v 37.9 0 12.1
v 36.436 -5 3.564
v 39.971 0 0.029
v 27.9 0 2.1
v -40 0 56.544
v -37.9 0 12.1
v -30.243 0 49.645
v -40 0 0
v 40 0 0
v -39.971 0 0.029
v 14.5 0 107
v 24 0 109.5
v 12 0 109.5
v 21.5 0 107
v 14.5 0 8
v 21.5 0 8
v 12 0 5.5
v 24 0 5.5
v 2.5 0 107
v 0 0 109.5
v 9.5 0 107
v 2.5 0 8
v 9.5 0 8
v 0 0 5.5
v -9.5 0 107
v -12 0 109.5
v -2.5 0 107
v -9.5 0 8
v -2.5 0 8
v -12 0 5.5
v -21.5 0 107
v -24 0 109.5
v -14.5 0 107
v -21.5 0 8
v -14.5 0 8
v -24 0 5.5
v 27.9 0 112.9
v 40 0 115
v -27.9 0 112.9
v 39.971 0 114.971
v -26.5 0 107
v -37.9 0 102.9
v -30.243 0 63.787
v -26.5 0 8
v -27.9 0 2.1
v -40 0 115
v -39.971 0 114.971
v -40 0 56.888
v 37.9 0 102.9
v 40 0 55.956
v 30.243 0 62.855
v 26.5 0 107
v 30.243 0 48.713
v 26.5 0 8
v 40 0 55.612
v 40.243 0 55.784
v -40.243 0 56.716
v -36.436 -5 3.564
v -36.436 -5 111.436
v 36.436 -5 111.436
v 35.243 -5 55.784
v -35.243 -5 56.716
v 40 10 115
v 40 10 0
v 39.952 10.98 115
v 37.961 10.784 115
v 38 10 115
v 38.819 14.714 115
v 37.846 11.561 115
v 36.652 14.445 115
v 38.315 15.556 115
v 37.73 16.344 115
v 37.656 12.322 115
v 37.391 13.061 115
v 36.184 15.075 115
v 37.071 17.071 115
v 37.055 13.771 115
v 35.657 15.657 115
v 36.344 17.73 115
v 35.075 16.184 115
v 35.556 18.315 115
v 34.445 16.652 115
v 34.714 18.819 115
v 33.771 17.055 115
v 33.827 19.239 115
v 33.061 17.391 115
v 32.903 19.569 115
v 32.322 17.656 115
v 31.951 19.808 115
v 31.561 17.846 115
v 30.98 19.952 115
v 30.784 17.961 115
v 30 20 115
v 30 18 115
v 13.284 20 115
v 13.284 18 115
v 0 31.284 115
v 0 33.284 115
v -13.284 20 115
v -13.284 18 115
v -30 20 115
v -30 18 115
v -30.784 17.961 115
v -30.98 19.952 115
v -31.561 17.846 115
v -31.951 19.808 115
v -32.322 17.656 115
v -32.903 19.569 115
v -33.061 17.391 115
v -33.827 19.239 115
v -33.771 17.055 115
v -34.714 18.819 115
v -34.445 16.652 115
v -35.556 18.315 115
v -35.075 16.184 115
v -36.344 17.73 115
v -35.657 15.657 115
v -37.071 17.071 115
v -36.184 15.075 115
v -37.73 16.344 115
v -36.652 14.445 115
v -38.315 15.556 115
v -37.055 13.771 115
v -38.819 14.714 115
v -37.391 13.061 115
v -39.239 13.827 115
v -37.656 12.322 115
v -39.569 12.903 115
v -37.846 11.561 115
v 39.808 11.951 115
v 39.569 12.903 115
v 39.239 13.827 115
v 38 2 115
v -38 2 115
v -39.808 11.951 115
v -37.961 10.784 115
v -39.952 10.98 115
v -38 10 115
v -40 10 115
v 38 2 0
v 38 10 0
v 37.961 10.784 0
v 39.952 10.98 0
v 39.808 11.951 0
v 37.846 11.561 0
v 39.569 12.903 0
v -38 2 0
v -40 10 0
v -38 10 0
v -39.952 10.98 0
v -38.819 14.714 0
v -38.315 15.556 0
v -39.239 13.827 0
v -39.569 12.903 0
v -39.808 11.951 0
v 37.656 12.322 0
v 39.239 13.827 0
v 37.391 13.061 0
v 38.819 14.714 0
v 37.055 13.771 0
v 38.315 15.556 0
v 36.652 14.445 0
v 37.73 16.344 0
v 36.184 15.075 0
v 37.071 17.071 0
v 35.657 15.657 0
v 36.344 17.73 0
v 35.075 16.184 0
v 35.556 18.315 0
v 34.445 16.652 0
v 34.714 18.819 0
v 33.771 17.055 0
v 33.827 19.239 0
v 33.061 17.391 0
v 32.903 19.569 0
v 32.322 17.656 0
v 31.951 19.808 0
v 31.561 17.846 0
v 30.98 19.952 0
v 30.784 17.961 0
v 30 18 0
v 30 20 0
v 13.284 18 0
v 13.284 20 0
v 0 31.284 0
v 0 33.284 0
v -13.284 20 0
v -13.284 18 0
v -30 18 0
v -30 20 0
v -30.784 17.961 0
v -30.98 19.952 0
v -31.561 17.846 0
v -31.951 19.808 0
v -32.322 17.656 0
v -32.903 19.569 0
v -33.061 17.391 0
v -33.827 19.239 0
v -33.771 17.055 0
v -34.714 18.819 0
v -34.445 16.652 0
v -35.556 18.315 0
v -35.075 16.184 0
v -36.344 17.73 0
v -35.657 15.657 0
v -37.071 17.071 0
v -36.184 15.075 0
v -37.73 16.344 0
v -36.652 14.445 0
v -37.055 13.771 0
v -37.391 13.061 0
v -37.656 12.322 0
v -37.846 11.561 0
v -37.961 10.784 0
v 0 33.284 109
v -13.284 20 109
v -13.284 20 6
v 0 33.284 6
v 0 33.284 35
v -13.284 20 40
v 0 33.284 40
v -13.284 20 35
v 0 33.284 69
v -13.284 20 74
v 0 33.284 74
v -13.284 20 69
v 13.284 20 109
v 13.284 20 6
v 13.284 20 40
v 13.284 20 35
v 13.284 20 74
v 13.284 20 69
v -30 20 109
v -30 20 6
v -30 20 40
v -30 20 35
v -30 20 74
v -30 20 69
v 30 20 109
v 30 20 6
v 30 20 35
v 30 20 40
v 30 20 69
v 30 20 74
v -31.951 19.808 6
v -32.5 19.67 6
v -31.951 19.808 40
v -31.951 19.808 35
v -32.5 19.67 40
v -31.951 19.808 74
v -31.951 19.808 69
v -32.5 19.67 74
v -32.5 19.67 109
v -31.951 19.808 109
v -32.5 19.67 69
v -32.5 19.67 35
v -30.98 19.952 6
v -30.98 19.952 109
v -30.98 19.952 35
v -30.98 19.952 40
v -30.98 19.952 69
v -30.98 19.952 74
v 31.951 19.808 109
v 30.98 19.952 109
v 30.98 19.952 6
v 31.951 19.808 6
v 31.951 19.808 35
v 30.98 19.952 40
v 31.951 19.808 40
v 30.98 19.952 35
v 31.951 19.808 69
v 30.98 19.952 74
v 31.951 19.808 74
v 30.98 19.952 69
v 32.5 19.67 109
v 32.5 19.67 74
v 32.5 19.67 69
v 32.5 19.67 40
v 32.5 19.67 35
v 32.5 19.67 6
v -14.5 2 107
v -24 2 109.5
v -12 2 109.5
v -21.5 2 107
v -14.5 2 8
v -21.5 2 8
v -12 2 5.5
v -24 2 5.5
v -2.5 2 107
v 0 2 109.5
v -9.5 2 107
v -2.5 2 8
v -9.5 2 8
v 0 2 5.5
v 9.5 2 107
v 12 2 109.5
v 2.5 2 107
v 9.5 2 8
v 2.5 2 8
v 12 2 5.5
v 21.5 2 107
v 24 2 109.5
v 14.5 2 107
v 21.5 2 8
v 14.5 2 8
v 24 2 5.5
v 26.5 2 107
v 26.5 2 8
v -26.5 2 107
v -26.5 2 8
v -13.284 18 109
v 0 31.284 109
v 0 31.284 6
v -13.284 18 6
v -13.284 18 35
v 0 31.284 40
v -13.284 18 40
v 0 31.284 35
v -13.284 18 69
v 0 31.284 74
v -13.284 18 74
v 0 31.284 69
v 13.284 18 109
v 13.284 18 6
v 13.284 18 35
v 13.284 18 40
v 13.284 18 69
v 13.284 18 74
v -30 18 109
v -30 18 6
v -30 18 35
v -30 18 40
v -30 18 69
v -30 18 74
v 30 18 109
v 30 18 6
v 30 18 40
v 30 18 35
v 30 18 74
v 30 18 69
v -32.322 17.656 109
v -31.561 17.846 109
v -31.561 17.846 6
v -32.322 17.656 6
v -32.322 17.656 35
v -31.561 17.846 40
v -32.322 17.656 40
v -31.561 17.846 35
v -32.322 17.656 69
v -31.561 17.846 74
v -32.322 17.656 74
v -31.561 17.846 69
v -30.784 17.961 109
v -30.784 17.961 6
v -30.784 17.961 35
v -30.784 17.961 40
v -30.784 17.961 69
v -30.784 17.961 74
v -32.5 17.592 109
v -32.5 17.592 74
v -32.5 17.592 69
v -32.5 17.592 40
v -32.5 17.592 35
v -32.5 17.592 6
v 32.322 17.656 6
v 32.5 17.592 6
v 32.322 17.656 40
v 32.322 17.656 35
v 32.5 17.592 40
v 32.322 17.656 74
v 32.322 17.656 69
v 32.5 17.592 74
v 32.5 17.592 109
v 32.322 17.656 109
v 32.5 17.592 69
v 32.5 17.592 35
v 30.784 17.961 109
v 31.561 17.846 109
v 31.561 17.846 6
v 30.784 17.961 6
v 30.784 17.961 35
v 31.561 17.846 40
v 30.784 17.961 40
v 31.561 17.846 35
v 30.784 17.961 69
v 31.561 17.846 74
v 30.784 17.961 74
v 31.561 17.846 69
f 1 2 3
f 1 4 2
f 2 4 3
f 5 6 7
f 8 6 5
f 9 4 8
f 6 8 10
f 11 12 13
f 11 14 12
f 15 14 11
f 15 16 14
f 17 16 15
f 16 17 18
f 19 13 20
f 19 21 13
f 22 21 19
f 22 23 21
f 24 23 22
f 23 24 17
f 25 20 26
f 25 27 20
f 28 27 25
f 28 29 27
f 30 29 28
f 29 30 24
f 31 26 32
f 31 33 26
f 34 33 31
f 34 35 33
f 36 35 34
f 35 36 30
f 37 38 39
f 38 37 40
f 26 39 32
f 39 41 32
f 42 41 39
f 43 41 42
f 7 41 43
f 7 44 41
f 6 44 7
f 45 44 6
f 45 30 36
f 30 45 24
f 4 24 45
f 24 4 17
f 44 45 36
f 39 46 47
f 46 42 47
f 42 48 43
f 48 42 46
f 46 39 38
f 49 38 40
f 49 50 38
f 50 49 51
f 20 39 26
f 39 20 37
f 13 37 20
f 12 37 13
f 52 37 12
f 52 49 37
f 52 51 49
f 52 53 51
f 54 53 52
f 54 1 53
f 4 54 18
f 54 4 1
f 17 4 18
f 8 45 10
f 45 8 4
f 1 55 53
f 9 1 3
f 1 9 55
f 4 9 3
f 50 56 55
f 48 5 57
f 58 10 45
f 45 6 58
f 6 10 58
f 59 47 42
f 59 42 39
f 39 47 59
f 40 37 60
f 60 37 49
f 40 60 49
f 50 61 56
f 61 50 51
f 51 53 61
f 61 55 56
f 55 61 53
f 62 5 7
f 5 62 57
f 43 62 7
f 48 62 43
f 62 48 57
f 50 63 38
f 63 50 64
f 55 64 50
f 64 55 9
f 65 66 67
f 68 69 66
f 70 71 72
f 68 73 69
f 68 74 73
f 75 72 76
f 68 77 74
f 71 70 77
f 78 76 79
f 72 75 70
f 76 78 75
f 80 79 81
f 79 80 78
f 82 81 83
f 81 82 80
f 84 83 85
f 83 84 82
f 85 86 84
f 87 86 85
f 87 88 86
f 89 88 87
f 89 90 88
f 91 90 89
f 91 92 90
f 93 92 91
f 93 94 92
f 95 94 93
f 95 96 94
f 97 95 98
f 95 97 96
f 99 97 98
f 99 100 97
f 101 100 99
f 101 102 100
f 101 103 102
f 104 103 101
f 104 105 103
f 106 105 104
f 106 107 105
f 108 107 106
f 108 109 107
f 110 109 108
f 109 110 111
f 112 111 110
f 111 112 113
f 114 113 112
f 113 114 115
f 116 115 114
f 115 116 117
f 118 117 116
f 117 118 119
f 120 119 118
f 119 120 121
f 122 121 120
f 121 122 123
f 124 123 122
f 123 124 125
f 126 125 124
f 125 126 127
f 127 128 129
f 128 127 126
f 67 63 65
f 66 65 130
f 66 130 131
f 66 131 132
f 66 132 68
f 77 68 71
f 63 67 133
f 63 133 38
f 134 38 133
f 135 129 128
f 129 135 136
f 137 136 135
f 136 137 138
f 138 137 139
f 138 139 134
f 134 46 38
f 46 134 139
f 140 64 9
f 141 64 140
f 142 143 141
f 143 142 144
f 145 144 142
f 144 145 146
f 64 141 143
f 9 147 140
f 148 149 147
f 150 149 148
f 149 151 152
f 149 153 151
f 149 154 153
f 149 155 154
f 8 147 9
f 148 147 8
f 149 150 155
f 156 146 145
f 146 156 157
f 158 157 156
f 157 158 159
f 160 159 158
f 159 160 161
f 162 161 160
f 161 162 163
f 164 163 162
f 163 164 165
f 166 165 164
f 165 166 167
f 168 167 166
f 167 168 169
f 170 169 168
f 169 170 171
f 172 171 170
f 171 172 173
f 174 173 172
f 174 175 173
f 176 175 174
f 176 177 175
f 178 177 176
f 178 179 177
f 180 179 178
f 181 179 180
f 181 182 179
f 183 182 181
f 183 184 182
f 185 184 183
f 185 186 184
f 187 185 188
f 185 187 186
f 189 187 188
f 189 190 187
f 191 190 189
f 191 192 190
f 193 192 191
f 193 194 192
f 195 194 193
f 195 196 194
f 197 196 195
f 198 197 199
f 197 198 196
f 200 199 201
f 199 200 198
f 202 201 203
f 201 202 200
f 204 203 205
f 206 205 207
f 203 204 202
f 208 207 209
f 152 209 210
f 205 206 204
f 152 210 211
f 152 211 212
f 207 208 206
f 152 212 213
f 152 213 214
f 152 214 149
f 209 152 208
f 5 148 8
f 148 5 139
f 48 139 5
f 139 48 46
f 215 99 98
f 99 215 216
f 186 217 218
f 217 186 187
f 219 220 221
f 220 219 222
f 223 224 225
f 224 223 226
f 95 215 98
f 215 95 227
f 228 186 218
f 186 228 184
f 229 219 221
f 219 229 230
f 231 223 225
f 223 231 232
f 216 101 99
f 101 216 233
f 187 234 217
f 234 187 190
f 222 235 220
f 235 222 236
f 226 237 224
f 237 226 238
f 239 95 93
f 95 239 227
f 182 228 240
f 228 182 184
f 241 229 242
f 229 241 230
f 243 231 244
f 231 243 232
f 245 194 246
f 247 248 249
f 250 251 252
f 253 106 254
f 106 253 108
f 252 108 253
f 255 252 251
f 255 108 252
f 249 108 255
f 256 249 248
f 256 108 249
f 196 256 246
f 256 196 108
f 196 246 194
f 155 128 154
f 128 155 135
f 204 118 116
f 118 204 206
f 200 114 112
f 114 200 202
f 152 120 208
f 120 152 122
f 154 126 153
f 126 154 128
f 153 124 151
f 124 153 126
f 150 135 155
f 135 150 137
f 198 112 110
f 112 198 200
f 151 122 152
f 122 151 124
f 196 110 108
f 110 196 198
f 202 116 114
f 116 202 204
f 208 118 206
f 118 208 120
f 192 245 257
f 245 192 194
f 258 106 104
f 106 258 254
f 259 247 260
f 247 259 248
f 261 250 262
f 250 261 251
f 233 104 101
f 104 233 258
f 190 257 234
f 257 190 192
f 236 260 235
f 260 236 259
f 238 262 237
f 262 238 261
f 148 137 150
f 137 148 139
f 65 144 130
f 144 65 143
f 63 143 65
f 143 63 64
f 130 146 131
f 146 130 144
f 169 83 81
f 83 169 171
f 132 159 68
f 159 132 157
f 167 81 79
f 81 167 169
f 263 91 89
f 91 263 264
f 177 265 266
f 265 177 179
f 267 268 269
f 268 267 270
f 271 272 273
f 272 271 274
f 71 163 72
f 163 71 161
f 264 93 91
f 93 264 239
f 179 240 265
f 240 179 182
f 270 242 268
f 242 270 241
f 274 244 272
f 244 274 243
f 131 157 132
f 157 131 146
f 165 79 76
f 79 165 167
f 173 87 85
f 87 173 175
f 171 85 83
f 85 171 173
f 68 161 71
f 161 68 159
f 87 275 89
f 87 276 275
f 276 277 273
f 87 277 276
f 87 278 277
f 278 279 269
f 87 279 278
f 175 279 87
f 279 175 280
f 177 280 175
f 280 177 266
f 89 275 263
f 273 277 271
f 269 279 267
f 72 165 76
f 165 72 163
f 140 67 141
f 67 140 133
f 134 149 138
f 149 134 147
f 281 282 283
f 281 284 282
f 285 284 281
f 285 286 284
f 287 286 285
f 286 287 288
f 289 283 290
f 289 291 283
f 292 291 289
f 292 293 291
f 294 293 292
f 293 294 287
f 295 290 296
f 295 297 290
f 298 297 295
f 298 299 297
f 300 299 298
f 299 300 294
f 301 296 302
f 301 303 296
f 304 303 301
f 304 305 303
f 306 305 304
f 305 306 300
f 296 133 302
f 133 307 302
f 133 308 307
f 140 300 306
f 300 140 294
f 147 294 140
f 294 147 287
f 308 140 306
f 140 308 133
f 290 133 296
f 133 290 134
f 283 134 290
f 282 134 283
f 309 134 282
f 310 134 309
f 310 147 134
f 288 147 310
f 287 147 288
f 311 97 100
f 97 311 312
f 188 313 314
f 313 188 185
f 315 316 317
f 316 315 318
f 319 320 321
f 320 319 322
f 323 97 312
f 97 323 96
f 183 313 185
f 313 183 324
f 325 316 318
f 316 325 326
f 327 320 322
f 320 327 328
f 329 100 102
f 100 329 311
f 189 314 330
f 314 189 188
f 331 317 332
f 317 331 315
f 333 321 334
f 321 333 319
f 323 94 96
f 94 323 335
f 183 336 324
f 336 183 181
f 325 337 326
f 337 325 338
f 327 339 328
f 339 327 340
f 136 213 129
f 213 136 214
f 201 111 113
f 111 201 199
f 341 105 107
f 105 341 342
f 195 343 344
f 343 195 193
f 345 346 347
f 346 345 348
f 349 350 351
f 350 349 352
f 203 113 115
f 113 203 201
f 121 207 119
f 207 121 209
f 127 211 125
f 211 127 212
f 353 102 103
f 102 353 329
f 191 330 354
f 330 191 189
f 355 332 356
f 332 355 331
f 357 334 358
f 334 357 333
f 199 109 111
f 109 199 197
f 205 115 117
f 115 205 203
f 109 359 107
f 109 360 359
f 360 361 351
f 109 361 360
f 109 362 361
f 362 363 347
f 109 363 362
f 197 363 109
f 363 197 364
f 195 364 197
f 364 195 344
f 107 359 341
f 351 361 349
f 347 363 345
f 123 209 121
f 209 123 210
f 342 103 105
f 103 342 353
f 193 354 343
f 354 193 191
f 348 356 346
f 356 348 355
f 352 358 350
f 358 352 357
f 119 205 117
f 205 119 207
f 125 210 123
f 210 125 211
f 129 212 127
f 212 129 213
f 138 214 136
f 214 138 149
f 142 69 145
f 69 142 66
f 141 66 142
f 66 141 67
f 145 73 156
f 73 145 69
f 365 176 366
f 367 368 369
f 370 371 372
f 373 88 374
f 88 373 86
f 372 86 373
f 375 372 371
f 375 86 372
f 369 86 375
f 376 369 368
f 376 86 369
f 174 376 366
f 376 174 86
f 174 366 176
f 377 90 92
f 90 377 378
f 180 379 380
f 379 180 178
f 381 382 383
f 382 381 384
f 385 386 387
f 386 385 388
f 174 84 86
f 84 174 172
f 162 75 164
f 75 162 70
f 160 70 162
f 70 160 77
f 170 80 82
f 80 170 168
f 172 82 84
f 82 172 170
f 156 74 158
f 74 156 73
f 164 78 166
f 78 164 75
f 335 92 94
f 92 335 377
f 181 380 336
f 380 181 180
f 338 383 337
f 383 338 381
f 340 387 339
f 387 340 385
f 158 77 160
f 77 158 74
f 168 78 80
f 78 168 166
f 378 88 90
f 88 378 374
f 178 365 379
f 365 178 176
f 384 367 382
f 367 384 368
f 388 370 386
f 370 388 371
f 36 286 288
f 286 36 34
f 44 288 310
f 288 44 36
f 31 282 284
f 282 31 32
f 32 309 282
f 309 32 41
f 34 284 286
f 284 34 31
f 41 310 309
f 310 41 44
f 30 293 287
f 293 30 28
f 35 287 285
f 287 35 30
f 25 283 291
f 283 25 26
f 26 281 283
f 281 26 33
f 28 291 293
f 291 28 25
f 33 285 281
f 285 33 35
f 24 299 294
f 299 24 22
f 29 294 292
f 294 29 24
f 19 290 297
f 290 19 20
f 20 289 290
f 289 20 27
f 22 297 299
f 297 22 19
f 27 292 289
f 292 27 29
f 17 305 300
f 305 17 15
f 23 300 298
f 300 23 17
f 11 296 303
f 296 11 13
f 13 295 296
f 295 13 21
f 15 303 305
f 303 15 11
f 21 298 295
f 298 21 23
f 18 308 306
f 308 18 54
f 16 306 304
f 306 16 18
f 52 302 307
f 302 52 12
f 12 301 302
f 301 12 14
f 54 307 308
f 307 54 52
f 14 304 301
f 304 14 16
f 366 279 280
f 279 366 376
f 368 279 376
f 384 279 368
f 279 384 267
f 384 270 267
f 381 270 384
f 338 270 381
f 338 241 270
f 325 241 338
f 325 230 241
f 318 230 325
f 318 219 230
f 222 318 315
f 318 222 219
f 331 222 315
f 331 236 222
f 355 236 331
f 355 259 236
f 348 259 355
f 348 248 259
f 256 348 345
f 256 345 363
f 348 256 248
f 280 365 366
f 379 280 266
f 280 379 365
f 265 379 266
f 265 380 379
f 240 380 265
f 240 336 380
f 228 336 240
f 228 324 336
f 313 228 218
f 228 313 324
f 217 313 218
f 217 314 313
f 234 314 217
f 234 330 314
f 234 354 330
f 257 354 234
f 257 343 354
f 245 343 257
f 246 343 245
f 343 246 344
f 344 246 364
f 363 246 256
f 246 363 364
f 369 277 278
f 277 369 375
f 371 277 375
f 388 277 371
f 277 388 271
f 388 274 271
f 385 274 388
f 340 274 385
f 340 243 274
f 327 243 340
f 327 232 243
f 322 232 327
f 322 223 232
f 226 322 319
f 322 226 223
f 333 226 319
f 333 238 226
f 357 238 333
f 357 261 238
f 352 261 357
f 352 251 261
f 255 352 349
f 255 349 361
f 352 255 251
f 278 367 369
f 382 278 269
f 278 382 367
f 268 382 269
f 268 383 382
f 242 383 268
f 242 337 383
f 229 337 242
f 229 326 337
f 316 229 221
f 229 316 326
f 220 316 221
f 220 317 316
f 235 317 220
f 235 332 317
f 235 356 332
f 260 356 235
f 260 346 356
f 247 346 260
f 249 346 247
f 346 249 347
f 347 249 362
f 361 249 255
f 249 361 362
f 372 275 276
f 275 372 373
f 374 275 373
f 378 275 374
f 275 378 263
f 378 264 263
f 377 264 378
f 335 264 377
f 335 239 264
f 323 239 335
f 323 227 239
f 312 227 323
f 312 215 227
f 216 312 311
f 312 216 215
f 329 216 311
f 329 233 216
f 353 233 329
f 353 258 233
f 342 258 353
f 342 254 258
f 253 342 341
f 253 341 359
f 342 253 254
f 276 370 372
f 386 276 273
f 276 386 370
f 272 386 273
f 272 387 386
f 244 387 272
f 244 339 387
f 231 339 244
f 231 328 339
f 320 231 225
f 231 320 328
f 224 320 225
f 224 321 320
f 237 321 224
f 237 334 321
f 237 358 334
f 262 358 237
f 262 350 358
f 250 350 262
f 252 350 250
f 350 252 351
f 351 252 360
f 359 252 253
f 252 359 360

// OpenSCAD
h = 115;
w = 50;
$fn = 64;

translate([0,0,0]) foot();
translate([-40,0,40]) rotate([0,90,0]) foot();
translate([0,0,h]) rotate([0,180,0]) foot();
translate([40,0,h-40]) rotate([0,270,0]) foot();

translate([12,0,h/2-30]) rotate([0,-45,0]) foot();
translate([-12,0,h-30]) rotate([0,135,0]) foot();


//translate([0,0,19]) rotate([0,180,0]) foot();
//translate([0,0,70]) rotate([0,180,0]) foot();

difference() {
  translate([-40,0,0]) case(80,20,10,h);
  translate([-38,2,-2]) case(76,16,8,h+4);
  translate([-32.5,4,6]) cube([65,100,29]);
  translate([-32.5,4,40]) cube([65,100,29]);
  translate([-32.5,4,74]) cube([65,100,35]);
  drainHoles();
}

module case(w,h,r,l) {
    cube(size=[w,h-r,l]);
    translate([w/2,h-15,0]) rotate([0,0,45]) cube(size=[20,20,l]);
    translate([r,0,0]) cube(size=[w-r*2,h,l]);
    translate([r,h-r,0]) cylinder(r=r,h=l);
    translate([w-r,h-r,0]) cylinder(r=r,h=l);
}

module foot() translate([27.9,0,2.1]) rotate([0,45,0]) difference() {
        rotate([45,0,45]) cube(size=[10,10,10]);
        translate([-50,0,0]) cube(size=[100,100,100]);
}



module drainHole() {
  dhw = 5;
  dhew = sqrt(pow(dhw,2)/2);
  translate([-dhw/2,-0.1,0]) {
    translate([0,0,8]) rotate([0,45,0]) cube([dhew,5,dhew]);
    translate([0,0,h-16+8]) rotate([0,45,0]) cube([dhew,5,dhew]);
    translate([0,0,8]) cube([dhw,5,h-16]);
  }
}
    
module drainHoles() {
  translate([-24,0,0]) drainHole();
  translate([-12,0,0]) drainHole();
  translate([0,0,0]) drainHole();
  translate([12,0,0]) drainHole();
  translate([24,0,0]) drainHole();
}
